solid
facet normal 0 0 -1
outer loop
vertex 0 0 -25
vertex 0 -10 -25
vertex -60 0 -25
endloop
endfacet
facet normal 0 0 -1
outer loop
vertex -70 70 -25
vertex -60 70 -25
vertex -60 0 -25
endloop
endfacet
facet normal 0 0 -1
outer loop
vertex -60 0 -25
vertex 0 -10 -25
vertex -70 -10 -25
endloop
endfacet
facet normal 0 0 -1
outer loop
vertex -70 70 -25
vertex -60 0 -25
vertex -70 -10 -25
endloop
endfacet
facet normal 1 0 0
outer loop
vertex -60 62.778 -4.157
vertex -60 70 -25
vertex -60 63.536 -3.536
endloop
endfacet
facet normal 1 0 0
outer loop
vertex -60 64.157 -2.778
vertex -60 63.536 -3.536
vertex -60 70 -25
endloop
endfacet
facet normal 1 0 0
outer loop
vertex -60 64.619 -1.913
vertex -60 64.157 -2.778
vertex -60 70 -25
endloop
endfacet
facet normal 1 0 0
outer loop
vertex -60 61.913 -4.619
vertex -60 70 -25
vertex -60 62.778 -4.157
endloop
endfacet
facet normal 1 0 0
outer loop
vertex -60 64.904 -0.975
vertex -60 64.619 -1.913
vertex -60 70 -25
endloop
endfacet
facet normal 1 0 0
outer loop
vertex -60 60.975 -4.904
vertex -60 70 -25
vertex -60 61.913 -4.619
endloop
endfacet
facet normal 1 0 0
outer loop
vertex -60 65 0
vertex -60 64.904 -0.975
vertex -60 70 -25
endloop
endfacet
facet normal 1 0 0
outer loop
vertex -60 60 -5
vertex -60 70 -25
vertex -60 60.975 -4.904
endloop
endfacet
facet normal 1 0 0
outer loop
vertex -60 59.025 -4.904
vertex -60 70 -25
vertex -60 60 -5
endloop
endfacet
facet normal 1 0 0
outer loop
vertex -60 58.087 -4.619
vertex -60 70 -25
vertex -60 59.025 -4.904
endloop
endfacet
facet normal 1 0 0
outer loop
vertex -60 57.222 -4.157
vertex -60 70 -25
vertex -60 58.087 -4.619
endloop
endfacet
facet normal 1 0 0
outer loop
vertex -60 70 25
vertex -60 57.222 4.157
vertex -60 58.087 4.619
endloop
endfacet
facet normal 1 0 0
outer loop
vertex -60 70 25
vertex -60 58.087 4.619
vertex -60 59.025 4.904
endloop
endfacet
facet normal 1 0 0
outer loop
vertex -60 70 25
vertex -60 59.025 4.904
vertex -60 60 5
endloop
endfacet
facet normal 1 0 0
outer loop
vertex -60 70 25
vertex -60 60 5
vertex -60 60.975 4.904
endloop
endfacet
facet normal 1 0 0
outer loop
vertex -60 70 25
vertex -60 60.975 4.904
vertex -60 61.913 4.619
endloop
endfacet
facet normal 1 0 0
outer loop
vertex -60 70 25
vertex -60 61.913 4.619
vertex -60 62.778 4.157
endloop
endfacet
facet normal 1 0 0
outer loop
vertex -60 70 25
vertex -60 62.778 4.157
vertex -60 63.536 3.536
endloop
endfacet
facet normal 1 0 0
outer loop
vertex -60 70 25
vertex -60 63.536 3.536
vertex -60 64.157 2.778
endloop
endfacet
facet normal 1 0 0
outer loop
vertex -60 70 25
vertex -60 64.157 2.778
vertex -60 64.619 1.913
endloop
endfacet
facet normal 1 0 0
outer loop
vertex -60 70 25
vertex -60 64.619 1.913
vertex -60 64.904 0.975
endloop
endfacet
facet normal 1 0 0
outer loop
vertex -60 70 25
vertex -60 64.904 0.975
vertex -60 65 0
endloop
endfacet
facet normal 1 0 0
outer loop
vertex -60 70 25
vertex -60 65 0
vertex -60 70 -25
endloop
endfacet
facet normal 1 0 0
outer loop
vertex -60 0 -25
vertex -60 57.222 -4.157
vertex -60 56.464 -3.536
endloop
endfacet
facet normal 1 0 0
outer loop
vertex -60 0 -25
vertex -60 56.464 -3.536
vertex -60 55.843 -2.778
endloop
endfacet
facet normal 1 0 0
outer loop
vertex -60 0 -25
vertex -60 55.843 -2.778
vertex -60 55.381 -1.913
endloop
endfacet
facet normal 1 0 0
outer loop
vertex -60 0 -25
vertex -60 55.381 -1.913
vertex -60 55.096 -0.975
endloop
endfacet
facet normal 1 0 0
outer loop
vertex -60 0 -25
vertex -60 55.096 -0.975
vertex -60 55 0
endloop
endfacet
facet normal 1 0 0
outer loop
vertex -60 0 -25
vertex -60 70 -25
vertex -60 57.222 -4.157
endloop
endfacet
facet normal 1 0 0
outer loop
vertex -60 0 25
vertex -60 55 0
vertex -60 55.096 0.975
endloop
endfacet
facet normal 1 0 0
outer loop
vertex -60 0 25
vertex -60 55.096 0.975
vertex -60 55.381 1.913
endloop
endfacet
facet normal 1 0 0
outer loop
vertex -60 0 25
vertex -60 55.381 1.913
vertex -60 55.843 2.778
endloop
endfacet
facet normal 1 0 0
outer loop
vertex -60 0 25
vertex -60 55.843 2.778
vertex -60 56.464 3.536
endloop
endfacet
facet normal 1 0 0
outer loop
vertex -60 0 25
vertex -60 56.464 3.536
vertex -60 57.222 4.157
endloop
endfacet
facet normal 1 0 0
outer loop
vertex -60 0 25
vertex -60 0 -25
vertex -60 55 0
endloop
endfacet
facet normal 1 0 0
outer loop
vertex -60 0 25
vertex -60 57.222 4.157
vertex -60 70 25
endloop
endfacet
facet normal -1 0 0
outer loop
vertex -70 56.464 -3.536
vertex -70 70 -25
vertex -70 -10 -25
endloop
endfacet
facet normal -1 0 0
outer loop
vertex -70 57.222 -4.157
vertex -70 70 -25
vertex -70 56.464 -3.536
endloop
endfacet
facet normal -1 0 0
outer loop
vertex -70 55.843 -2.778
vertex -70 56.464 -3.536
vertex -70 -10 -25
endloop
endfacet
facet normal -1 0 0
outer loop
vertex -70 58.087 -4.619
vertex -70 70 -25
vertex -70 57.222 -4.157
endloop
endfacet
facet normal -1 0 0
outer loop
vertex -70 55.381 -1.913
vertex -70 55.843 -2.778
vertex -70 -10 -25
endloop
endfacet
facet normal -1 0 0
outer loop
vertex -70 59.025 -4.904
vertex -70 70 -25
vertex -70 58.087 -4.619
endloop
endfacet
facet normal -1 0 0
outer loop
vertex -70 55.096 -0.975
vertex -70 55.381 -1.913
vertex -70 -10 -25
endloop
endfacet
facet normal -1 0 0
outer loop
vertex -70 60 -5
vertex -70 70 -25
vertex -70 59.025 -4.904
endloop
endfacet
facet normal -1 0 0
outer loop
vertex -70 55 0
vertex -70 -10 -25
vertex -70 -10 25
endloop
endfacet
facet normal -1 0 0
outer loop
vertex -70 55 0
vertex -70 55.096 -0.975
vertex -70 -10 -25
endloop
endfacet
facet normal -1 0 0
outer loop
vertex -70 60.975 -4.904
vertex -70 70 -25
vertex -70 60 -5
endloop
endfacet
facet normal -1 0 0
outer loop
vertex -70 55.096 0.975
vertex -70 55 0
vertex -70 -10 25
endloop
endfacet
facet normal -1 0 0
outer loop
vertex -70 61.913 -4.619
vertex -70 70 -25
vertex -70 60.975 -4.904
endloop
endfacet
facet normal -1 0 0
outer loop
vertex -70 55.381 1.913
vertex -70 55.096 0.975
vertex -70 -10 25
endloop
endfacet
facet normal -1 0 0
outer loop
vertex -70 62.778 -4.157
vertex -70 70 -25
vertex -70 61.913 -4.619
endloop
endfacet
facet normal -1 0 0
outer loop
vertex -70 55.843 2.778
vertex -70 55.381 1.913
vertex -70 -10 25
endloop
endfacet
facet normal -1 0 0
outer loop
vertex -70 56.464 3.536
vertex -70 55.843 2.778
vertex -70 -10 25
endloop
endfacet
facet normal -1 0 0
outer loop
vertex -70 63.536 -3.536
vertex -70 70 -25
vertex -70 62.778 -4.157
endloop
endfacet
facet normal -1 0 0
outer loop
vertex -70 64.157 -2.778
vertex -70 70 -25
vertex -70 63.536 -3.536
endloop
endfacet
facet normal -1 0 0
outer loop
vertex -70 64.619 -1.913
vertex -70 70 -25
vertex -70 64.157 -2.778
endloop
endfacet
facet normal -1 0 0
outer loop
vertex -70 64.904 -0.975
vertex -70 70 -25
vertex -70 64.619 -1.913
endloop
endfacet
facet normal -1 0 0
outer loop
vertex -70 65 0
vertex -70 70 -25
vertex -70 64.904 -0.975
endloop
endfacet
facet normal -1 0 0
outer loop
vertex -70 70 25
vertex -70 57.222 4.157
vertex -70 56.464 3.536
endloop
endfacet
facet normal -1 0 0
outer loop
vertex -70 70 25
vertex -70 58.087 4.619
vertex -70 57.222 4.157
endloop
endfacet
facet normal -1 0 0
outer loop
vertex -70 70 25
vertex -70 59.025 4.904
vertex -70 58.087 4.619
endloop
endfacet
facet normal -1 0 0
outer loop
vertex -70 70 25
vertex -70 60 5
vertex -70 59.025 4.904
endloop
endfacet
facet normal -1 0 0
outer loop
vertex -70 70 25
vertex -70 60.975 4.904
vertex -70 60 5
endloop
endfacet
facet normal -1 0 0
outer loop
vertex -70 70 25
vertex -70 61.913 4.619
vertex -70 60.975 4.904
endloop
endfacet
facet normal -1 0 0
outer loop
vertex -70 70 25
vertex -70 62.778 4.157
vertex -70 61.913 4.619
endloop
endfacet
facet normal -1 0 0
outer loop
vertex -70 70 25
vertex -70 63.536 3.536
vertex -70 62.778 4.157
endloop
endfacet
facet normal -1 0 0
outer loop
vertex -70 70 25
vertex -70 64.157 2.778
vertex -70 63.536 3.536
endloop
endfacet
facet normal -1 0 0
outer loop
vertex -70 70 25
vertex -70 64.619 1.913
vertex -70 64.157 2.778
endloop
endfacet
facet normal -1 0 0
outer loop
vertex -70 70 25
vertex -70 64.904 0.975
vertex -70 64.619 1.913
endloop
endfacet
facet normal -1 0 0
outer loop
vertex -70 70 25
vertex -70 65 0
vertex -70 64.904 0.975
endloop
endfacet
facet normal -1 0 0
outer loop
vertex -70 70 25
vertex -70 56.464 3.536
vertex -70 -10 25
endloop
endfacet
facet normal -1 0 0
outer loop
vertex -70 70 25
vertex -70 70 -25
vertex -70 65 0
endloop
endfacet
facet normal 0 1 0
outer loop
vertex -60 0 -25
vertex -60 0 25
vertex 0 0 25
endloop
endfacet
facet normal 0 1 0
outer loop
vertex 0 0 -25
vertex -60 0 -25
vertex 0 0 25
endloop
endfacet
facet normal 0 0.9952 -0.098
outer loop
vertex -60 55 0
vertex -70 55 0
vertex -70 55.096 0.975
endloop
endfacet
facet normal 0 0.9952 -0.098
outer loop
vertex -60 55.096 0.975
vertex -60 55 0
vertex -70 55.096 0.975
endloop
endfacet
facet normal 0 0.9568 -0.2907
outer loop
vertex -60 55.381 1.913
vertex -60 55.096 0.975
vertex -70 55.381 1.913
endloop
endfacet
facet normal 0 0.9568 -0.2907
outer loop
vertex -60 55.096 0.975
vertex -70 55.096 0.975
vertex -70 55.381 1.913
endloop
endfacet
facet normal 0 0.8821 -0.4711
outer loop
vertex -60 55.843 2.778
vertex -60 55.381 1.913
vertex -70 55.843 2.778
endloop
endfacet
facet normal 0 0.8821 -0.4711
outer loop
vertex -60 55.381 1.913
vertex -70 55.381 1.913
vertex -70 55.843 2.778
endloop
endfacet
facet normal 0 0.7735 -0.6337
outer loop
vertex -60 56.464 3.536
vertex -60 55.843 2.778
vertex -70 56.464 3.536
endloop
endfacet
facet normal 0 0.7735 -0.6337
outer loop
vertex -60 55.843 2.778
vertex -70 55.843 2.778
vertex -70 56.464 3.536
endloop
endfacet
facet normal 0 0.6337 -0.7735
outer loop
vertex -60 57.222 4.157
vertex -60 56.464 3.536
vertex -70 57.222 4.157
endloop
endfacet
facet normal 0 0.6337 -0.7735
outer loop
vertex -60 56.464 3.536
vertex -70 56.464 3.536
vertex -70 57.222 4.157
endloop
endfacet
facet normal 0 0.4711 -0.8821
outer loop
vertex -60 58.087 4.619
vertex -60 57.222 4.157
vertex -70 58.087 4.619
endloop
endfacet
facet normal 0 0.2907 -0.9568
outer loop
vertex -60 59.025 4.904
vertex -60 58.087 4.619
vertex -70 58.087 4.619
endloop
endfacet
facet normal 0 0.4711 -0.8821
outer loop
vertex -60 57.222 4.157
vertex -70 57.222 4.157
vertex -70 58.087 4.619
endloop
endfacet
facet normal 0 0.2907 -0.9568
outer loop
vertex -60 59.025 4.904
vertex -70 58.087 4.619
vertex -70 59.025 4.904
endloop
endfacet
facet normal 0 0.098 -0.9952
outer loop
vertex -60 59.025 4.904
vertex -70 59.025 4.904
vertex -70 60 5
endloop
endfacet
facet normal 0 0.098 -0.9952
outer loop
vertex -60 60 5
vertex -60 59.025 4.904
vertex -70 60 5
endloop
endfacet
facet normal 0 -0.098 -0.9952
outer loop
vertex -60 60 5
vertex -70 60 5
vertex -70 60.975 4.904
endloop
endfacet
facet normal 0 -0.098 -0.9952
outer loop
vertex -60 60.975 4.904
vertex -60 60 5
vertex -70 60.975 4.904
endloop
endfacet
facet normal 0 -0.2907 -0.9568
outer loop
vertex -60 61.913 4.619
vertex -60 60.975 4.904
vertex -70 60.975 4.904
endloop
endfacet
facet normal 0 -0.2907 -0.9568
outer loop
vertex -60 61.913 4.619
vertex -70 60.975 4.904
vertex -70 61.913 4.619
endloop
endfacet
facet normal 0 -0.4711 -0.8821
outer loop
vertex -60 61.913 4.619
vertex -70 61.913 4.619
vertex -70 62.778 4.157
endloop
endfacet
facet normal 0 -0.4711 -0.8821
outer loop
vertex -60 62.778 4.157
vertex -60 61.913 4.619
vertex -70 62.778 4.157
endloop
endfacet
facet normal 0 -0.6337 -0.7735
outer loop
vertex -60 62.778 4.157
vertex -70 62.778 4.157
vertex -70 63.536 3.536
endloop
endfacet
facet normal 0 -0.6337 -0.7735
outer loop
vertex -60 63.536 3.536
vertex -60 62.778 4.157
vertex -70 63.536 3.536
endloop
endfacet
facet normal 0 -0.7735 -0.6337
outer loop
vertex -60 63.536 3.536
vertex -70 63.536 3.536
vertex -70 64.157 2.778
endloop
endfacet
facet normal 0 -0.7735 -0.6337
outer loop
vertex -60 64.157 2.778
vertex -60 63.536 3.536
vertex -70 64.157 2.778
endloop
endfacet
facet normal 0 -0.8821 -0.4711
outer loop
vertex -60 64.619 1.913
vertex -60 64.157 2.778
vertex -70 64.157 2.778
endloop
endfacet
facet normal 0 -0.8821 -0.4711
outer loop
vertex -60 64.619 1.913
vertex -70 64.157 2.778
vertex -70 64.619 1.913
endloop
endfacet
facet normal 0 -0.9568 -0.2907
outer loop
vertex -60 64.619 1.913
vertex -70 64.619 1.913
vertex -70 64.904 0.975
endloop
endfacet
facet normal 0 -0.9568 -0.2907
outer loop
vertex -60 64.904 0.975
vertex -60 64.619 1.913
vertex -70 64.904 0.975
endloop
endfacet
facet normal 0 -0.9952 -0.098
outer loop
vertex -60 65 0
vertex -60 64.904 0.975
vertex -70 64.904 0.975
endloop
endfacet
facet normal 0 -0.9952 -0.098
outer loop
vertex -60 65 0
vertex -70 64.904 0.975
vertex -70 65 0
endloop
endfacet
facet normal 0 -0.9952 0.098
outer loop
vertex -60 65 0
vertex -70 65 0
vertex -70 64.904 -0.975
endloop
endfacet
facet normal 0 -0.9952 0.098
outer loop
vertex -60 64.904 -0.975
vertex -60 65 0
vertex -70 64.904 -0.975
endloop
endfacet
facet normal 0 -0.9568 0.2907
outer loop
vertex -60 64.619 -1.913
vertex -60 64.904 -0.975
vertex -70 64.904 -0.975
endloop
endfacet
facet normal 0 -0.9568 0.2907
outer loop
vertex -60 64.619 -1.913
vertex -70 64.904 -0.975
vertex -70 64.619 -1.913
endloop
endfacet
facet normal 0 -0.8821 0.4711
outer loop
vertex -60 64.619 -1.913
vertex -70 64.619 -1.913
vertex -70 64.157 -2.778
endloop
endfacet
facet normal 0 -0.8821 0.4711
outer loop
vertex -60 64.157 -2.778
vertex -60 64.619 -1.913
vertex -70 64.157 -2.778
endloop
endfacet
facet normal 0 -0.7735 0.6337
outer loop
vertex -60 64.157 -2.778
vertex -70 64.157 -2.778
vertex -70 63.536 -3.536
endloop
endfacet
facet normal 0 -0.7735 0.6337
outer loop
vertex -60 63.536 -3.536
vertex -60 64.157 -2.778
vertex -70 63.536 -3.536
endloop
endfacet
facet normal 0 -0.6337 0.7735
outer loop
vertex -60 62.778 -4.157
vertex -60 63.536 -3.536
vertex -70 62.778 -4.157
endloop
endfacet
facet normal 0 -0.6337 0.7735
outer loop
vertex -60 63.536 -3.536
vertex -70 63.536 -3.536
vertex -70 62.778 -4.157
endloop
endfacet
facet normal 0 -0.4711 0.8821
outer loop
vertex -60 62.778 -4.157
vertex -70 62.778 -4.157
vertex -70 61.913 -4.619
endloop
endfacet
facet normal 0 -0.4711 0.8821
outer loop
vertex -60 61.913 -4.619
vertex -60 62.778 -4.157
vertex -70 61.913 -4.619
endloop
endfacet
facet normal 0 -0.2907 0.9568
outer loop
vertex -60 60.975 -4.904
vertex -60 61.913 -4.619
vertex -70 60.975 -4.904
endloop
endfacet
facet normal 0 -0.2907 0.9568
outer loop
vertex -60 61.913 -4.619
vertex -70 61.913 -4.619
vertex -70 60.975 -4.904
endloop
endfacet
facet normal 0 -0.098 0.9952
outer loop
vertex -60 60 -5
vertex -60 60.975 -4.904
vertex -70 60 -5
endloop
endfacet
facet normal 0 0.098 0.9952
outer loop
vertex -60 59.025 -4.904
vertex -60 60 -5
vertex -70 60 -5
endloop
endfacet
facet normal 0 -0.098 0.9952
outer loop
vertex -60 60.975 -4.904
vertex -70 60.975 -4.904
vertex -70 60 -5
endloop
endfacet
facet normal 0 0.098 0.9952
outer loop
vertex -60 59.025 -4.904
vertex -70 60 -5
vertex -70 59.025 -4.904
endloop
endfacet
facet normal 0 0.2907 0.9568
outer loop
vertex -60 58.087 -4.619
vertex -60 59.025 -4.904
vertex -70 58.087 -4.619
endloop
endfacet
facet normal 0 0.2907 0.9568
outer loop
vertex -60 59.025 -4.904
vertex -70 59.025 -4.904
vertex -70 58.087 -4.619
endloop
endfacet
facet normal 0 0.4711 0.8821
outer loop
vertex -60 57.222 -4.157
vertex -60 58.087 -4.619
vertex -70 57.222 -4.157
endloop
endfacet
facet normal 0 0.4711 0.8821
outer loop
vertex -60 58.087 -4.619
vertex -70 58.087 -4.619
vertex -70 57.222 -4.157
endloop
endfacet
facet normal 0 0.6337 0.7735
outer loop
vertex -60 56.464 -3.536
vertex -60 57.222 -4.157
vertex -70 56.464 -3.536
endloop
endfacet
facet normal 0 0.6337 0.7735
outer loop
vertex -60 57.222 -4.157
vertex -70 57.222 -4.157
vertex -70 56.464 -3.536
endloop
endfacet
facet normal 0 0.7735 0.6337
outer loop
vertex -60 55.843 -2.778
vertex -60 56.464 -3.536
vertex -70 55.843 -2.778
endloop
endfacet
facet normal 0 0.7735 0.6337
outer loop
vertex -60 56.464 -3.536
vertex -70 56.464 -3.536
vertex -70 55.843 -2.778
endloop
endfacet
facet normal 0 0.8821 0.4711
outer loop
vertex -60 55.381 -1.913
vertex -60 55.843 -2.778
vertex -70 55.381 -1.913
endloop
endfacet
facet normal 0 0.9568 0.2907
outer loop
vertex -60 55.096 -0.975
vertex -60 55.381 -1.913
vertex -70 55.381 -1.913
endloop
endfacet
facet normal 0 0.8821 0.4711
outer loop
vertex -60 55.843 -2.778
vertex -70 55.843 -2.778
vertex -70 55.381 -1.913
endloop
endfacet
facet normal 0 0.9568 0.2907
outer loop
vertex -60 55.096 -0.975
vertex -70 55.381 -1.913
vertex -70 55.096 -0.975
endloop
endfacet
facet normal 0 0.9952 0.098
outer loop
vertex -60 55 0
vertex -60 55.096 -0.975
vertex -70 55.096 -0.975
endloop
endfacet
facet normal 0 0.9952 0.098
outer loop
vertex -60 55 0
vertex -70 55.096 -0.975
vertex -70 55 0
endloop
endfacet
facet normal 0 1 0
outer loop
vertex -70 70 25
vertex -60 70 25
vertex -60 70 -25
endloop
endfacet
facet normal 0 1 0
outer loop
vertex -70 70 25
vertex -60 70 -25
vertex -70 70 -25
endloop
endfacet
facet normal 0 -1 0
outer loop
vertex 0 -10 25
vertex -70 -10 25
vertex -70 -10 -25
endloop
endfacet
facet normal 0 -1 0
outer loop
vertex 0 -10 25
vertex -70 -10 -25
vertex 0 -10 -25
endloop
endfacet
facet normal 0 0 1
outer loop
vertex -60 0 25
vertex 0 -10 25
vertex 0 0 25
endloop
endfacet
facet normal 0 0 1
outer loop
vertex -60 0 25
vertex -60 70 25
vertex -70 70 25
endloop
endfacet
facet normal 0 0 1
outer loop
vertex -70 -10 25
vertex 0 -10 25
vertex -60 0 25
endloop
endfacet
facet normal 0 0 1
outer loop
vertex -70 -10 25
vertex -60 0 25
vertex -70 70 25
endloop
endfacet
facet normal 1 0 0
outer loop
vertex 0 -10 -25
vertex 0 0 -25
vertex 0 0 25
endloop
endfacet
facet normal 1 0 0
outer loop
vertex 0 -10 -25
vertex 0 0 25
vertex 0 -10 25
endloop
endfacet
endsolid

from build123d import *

# Parameters (mm, degrees)
F0_W     = 140
F0_H     = 50
F1_DEPTH = 10
F2_W     = 10
F2_H     = 50
F3_DEPTH = 70
F4_R     = 5
F5_DEPTH = 140.001
F6_W     = 140.089303
F6_H     = 159.690752
F7_DEPTH = 50.001


with BuildPart() as f1:
    # F0 (on Front) → F1 (new body)
    with BuildSketch(Plane.XZ):
        Rectangle(F0_W, F0_H)
    extrude(amount=F1_DEPTH)

    # F2 (on face) → F3 (join)
    with BuildSketch(Plane(origin=(0, 0, 0), x_dir=(-1, 0, 0), z_dir=(0, 1, 0))):
        with Locations((-65, 0)):
            Rectangle(F2_W, F2_H)
        with Locations((65, 0)):
            Rectangle(F2_W, F2_H)
    extrude(amount=F3_DEPTH)

    # F4 (on face) → F5 (cut, through all)
    with BuildSketch(Plane(origin=(-70, 0, 0), x_dir=(0, -1, 0), z_dir=(-1, 0, 0))):
        with Locations((-60, 0)):
            Circle(F4_R)
    extrude(amount=-F5_DEPTH, mode=Mode.SUBTRACT)

    # F6 (on face) → F7 (cut, through all)
    with BuildSketch(Plane(origin=(0, 0, -25), x_dir=(1, 0, 0), z_dir=(0, 0, -1))):
        with Locations((70.044652, -4.198499)):
            Rectangle(F6_W, F6_H)
    extrude(amount=-F7_DEPTH, mode=Mode.SUBTRACT)


solid = f1.part
